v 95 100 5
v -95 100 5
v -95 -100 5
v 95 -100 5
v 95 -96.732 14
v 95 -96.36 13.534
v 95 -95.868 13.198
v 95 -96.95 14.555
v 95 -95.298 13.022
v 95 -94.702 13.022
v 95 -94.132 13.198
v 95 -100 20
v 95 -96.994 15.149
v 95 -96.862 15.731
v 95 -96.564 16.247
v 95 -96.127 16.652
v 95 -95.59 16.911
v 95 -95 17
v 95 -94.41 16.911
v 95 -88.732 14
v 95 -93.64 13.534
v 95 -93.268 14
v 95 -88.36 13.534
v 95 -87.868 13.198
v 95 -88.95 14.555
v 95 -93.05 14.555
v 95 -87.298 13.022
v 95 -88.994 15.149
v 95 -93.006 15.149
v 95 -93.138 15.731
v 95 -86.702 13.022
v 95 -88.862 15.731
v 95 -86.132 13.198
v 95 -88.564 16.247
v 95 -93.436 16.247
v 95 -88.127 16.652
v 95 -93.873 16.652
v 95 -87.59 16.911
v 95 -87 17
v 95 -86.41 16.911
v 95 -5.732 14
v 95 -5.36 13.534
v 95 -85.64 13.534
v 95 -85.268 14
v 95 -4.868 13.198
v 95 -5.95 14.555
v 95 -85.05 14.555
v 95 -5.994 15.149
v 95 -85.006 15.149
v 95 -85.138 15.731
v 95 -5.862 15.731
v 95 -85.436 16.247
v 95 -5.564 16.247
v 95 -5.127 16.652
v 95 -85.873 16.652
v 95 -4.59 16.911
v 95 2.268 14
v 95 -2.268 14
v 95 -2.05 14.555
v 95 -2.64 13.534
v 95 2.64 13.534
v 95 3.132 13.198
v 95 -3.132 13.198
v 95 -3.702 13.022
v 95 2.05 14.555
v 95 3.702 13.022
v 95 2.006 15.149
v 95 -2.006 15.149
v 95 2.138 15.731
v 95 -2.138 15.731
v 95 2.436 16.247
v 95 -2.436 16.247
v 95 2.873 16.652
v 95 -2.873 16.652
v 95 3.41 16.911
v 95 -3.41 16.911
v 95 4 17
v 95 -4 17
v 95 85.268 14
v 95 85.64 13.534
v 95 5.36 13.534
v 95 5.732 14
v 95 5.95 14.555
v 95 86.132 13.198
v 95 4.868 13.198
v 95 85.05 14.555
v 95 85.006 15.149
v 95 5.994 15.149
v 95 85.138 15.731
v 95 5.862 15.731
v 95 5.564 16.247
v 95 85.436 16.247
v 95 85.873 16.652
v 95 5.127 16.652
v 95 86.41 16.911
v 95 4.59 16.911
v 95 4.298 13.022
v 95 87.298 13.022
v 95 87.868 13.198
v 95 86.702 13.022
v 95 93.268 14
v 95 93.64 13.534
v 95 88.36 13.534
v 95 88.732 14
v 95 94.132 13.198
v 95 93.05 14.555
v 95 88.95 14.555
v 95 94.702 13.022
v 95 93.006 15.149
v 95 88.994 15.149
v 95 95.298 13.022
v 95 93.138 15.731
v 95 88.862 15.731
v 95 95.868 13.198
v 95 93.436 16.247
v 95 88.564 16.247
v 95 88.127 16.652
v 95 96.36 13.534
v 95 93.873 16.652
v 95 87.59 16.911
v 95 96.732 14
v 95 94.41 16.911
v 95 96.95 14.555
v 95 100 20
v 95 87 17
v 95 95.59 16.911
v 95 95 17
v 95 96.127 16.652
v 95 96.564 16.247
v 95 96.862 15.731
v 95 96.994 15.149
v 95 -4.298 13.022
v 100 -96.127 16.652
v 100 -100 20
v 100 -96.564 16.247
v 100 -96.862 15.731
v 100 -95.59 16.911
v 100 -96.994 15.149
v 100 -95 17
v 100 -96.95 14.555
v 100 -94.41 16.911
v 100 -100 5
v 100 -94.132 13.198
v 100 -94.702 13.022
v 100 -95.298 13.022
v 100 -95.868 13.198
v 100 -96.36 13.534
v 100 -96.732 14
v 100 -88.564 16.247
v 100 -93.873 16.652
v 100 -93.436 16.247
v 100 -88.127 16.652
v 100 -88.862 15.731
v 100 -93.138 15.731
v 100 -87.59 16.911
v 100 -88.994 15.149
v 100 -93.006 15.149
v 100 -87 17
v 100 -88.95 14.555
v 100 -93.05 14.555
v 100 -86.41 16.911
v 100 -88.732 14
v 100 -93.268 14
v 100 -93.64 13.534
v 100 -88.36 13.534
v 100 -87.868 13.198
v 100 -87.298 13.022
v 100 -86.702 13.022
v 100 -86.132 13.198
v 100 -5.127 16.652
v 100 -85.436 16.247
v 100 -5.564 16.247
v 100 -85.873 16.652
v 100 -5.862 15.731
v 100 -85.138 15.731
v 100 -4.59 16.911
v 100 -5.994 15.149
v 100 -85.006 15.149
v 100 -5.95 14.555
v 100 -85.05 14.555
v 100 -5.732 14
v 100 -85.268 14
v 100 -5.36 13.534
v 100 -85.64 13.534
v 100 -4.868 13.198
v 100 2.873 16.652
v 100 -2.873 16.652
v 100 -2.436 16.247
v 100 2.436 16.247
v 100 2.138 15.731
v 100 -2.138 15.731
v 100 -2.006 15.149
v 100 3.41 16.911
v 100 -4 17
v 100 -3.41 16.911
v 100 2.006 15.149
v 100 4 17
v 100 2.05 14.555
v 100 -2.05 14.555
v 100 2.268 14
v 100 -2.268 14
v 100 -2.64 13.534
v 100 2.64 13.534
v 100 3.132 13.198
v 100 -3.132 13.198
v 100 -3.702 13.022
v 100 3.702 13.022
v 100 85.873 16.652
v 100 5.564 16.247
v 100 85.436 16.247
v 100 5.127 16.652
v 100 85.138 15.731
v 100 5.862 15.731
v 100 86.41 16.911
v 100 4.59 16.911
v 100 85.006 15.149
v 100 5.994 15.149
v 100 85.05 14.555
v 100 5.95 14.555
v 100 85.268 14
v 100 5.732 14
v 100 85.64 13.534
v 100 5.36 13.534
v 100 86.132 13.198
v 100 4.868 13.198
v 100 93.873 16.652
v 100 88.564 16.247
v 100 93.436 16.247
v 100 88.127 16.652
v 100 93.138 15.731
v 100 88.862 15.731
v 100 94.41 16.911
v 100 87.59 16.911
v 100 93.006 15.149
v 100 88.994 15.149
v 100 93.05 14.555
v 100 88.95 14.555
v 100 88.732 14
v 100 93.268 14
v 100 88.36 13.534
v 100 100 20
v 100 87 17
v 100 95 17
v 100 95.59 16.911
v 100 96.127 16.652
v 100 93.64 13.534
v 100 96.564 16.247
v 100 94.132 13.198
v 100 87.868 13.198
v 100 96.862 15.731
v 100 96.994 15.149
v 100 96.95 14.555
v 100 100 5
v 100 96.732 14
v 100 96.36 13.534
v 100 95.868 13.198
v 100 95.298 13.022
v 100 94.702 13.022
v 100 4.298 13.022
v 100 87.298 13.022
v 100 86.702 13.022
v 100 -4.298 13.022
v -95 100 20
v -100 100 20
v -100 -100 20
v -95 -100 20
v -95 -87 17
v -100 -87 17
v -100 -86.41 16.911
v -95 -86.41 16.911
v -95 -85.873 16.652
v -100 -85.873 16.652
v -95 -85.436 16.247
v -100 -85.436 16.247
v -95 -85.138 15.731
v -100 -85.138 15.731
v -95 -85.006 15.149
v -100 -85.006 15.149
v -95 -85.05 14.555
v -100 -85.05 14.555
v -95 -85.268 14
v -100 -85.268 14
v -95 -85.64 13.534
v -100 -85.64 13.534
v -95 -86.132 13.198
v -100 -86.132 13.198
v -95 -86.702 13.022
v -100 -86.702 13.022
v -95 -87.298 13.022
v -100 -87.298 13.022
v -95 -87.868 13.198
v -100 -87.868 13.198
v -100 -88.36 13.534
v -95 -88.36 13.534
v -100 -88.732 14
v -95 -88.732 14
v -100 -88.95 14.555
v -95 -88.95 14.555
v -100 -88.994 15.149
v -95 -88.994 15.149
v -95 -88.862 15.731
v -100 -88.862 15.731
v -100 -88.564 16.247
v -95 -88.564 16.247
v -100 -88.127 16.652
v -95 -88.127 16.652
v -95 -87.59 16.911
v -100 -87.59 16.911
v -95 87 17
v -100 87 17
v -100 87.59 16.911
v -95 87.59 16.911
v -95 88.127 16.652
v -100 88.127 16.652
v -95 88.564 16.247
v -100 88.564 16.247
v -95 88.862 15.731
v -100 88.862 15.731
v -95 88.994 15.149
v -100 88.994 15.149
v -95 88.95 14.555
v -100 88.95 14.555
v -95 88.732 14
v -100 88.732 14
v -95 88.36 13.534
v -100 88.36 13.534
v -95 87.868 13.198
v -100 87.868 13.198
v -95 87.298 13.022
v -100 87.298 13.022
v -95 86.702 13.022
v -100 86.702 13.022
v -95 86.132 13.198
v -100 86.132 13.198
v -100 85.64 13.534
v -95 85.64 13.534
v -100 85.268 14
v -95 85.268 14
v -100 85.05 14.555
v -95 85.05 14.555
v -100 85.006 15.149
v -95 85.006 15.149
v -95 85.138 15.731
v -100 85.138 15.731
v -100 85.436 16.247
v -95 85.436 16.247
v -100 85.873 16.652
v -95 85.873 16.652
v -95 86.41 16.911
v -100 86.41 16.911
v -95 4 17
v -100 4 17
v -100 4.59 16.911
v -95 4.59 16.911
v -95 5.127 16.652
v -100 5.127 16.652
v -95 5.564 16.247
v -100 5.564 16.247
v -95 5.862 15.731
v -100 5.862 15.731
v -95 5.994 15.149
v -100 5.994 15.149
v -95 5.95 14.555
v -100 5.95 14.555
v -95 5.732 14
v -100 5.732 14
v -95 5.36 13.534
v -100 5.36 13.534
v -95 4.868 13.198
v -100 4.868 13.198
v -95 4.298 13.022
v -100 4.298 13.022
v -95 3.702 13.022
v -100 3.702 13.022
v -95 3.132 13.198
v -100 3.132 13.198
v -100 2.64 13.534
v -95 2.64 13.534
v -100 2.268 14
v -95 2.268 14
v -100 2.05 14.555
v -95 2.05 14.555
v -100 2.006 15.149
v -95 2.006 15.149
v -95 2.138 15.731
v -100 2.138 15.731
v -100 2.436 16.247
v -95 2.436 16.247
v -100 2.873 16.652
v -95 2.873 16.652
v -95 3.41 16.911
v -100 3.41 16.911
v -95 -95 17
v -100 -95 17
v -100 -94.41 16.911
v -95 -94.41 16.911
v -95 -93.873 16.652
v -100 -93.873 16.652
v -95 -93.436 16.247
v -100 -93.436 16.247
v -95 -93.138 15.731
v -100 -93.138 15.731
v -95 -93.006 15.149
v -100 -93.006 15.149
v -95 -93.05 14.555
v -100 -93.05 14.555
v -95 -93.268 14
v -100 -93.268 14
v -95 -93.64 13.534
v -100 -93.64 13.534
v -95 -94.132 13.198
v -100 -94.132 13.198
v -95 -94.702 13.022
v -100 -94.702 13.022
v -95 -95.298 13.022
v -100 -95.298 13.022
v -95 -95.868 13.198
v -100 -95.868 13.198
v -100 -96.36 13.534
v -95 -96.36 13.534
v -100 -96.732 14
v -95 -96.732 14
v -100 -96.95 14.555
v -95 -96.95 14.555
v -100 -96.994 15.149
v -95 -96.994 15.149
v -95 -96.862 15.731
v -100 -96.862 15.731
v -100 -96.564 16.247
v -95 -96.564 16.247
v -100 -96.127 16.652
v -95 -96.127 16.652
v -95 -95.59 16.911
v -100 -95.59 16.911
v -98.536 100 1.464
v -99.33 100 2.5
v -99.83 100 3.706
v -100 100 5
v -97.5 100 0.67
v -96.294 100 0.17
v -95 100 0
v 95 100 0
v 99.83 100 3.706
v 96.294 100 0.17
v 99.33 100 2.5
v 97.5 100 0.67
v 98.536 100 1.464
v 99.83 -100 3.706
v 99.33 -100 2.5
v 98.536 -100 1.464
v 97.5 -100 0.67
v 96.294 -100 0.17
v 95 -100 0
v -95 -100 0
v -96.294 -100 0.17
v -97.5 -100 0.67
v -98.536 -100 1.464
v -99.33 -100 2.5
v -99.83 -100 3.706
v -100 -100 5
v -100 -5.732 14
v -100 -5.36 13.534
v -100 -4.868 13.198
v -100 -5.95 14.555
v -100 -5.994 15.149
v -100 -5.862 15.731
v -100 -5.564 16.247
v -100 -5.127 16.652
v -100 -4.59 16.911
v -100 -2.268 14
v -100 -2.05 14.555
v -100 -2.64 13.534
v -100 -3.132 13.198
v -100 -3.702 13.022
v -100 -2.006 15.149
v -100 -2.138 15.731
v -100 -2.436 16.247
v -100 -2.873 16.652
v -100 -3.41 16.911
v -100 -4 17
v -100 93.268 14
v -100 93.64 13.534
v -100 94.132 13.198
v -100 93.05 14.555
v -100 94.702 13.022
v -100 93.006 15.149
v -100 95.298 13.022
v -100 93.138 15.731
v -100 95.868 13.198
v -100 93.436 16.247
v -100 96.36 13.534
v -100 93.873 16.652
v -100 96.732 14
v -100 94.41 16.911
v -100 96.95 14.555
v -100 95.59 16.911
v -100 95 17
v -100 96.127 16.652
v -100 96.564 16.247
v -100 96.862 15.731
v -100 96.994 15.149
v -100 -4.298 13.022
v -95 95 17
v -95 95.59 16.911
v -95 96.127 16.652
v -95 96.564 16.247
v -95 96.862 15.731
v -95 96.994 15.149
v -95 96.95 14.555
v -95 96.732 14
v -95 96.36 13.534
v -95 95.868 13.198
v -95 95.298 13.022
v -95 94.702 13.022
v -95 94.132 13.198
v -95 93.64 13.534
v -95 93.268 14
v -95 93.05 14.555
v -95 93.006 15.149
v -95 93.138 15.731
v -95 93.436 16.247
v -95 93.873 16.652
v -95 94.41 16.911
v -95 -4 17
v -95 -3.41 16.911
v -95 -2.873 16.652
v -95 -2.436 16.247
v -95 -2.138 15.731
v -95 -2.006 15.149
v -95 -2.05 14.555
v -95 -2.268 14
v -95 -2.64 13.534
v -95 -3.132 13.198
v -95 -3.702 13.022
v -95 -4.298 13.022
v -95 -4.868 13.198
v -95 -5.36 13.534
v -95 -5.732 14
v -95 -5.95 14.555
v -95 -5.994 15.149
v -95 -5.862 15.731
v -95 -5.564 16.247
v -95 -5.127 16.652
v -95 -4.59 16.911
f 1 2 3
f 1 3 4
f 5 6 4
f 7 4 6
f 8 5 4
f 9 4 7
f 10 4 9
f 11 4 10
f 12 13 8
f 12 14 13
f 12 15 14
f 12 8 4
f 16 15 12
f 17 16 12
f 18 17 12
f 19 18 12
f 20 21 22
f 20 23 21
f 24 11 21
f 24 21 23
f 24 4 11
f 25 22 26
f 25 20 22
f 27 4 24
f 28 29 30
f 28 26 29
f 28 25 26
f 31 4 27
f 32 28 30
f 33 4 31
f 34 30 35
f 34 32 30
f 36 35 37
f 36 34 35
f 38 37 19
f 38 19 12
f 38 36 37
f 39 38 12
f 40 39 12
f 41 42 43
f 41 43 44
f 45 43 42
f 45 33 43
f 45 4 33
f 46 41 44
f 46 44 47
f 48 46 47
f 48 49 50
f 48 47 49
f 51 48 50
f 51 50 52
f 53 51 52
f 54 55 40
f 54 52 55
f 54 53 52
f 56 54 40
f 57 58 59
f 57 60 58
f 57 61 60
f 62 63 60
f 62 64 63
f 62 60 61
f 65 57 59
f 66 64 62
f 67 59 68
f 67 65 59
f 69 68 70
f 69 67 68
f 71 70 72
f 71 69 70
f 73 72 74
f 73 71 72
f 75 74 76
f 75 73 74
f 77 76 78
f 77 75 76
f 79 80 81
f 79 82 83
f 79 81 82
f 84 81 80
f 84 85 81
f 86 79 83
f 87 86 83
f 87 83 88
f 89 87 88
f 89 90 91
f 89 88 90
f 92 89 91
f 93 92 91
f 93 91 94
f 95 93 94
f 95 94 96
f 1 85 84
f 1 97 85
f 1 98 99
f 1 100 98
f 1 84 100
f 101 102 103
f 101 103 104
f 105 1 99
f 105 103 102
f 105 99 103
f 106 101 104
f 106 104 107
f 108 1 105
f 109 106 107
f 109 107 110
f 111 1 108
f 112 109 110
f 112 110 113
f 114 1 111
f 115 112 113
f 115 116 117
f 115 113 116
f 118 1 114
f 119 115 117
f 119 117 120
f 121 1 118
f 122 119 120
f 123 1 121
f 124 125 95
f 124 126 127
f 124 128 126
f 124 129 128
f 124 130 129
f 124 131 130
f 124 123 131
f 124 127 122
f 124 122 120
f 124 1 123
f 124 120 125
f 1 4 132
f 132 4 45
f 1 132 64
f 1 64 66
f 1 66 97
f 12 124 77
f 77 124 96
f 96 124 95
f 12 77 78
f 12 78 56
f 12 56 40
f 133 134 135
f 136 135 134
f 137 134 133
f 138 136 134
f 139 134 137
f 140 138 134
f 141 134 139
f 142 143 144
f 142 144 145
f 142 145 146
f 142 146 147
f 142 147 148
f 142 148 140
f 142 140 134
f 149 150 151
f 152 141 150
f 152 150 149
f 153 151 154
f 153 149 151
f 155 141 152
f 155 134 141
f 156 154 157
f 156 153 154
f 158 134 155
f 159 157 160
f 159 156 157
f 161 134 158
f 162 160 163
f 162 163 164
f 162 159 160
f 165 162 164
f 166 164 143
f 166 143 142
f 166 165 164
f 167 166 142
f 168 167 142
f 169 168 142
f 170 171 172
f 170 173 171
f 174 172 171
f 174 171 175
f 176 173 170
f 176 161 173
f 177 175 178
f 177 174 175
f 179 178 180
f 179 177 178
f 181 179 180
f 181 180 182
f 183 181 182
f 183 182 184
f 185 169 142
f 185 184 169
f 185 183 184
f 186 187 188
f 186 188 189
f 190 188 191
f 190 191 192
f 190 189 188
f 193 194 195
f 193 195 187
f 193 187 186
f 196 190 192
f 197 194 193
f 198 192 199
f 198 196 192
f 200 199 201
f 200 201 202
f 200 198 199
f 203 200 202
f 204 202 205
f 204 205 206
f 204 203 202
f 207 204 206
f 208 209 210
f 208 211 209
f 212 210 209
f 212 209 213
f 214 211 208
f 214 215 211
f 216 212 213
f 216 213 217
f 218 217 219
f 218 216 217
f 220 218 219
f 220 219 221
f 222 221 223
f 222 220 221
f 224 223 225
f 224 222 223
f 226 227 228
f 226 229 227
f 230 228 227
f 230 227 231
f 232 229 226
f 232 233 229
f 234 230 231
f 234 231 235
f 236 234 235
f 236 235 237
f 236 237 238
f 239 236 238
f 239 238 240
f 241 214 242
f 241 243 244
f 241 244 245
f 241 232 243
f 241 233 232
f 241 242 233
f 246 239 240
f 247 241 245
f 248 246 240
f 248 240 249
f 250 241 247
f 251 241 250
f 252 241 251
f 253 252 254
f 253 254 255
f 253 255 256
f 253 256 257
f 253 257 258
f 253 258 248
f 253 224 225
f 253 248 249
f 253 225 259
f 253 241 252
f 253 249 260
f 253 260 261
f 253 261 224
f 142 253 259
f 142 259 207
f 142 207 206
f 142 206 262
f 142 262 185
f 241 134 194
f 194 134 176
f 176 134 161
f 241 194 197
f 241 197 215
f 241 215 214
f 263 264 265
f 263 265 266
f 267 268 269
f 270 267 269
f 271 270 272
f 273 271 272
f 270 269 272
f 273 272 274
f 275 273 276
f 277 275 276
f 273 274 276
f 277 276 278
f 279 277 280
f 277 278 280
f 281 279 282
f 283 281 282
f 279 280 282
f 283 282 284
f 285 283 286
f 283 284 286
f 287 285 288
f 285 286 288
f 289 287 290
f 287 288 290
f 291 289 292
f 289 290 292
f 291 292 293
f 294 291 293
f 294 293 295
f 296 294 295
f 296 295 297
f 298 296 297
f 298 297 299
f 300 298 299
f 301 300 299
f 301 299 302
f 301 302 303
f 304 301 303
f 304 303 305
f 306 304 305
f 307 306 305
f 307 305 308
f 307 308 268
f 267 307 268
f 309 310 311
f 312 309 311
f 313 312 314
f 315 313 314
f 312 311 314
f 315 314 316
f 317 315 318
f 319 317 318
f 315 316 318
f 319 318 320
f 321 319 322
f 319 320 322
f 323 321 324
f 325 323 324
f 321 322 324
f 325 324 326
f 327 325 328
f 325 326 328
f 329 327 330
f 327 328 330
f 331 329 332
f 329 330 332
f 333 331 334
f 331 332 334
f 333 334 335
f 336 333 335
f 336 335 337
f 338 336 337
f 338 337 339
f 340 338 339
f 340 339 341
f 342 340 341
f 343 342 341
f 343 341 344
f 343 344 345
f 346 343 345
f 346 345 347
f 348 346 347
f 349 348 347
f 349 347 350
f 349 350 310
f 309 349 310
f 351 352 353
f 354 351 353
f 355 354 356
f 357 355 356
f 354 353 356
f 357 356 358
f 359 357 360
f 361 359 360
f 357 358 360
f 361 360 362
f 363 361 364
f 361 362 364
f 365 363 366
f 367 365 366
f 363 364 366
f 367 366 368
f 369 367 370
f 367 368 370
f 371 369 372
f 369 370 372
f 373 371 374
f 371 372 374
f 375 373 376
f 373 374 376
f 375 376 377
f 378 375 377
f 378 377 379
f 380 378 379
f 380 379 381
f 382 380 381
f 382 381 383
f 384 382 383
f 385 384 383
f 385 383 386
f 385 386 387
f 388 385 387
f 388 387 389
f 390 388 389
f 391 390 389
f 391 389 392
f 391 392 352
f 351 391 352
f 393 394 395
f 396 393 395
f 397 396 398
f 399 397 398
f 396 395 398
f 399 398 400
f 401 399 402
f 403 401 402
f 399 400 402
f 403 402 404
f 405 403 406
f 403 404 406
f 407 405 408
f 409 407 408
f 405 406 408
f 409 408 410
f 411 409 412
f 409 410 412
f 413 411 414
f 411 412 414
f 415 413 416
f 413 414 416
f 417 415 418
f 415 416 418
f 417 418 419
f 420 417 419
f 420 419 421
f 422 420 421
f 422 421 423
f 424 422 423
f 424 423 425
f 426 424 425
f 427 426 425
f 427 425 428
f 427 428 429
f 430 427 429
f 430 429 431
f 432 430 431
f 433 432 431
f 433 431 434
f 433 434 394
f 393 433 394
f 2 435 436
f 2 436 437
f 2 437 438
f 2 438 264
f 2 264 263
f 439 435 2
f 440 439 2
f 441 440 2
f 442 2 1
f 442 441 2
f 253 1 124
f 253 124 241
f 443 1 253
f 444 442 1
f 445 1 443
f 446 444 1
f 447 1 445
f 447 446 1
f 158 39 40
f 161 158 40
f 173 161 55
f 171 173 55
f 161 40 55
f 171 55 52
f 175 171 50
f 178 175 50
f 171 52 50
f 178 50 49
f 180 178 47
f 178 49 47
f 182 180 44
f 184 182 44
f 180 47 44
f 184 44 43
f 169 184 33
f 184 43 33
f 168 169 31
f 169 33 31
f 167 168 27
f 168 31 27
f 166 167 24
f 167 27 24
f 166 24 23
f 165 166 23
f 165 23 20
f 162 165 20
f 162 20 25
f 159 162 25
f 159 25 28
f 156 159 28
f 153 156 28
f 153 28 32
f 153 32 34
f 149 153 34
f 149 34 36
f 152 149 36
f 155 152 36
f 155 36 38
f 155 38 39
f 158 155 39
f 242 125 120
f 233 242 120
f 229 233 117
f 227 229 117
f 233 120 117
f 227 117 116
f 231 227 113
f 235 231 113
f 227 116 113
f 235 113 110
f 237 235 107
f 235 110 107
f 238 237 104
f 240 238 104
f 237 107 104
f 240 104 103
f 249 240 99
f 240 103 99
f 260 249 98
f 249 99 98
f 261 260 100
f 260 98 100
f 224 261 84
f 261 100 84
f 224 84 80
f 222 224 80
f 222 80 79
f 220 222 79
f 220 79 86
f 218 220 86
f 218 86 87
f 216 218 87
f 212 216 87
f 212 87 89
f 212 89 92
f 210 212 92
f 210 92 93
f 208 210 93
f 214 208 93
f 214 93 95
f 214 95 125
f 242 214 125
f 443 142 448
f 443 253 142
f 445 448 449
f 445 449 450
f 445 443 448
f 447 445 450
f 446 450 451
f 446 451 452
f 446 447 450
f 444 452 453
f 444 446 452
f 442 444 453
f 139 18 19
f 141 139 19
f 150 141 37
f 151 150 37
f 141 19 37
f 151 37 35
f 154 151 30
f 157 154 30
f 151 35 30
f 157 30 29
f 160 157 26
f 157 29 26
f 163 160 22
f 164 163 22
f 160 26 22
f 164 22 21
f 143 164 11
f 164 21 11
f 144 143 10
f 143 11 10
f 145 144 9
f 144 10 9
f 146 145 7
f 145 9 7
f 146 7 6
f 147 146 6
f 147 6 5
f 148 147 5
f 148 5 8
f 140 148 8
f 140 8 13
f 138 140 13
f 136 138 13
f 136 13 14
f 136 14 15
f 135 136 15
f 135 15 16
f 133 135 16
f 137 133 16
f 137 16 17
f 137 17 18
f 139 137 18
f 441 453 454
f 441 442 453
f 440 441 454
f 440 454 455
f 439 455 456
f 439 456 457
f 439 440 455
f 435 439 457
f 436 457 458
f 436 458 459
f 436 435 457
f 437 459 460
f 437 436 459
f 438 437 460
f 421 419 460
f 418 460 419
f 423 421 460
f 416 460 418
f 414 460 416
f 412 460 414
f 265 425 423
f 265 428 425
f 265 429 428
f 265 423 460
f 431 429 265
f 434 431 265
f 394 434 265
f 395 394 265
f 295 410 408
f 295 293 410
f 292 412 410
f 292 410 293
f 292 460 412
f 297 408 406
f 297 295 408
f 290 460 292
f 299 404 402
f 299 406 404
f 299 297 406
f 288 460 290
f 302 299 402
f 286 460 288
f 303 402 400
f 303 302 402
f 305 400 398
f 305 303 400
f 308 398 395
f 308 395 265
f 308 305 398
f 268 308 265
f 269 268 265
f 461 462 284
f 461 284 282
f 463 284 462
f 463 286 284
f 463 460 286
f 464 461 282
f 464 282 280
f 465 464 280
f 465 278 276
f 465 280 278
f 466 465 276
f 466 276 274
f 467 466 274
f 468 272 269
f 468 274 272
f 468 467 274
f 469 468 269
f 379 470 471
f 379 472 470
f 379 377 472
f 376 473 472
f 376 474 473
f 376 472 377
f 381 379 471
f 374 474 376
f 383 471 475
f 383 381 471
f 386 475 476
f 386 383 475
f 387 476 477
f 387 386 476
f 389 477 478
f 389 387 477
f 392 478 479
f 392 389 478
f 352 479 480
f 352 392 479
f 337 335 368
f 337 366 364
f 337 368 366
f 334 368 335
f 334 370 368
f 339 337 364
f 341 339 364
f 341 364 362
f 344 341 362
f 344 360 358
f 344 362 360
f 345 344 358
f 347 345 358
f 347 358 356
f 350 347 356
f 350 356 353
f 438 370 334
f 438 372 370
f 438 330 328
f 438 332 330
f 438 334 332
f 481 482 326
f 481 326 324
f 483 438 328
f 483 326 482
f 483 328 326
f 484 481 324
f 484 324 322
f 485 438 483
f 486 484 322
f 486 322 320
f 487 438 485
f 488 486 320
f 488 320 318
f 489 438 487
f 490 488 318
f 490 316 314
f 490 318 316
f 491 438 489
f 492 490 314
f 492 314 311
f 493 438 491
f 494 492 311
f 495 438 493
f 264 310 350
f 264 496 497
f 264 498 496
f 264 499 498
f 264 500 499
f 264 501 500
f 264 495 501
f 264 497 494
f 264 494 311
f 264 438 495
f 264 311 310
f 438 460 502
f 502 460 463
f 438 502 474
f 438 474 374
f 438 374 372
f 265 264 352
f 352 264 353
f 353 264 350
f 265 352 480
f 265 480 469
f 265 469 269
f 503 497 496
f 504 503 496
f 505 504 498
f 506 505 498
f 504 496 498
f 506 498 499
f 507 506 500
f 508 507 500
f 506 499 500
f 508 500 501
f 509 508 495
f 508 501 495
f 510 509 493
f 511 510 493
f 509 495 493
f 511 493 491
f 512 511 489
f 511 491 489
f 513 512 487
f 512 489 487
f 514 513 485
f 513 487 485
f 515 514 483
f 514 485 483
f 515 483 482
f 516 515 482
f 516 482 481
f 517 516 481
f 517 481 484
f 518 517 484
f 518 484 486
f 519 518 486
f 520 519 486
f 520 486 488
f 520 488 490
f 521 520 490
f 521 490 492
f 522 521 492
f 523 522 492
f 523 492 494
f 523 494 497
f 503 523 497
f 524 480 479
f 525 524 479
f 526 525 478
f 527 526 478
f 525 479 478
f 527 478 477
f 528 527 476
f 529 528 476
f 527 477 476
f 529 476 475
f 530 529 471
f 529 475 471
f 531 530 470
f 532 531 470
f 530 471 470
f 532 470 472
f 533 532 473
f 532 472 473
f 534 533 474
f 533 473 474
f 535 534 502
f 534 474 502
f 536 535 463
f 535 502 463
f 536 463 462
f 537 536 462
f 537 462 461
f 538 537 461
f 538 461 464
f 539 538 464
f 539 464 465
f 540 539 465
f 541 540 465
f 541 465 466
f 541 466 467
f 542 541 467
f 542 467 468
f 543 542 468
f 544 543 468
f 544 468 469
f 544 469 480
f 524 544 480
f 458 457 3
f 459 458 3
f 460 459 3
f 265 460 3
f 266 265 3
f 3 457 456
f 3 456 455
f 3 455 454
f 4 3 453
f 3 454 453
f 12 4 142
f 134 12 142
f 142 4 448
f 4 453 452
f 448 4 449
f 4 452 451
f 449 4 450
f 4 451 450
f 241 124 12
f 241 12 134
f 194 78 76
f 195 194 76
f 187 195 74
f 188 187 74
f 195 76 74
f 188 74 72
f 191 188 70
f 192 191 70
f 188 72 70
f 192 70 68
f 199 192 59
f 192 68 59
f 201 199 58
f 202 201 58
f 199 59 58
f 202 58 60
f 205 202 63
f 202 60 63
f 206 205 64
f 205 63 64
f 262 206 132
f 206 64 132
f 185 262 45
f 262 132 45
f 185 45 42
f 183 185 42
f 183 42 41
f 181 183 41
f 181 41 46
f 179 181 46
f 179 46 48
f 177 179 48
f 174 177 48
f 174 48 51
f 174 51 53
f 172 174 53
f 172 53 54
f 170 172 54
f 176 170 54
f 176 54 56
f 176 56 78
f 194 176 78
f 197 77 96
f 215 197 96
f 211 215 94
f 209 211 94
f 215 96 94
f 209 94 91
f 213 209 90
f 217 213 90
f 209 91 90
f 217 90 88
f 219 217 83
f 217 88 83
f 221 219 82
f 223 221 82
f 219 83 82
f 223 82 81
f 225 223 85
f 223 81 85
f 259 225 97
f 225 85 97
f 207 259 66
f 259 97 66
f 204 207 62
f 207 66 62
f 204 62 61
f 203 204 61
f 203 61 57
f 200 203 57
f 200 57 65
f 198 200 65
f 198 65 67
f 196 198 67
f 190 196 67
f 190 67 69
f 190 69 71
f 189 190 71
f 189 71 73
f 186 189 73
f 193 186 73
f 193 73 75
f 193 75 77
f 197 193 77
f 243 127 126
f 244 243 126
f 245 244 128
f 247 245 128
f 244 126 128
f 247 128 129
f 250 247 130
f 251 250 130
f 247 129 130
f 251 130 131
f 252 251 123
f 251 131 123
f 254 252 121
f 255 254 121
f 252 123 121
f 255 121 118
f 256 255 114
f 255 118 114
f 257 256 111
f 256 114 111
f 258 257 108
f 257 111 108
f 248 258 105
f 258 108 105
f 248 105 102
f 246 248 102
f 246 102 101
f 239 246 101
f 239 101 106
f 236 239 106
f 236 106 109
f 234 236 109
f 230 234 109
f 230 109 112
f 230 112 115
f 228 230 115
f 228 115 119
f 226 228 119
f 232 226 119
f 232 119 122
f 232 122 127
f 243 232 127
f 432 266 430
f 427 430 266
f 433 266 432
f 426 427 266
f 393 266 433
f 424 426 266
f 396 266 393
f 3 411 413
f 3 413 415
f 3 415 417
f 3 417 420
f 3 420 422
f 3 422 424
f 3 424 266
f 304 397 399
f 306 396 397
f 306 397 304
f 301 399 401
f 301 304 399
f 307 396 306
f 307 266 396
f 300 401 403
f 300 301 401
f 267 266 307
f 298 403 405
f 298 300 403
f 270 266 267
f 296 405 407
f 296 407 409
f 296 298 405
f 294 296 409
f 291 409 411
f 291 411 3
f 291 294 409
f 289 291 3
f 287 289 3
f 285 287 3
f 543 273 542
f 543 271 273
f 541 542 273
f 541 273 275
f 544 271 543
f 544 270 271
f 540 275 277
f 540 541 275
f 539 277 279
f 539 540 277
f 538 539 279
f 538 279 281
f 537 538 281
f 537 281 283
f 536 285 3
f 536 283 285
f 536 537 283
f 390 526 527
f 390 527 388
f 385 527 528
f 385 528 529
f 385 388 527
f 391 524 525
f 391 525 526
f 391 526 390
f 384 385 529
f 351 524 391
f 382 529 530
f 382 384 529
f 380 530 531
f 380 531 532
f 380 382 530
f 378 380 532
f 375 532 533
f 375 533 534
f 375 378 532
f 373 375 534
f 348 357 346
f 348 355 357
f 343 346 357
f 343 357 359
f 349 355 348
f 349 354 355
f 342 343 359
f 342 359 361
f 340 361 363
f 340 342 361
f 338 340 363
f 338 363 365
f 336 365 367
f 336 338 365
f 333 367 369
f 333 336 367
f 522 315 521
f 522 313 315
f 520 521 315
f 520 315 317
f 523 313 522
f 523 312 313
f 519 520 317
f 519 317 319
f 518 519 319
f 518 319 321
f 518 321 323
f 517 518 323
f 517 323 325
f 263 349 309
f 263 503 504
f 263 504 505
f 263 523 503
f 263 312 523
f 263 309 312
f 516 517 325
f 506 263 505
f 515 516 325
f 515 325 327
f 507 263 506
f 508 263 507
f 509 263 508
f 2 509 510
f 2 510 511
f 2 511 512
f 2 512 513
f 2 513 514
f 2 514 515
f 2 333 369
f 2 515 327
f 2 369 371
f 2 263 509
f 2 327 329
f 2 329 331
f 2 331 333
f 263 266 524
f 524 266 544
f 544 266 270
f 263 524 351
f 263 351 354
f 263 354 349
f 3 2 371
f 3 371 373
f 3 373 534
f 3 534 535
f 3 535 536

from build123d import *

# Parameters (mm, degrees)
BOSS_EXTRUDE1_DEPTH = 100
SKETCH4_R           = 2
CUT_EXTRUDE1_DEPTH  = 214


with BuildPart() as part:
    # Sketch3 → Boss-Extrude1 (new, symmetric)
    with BuildSketch(Plane(origin=(0, 0, 0), x_dir=(1, 0, 0), z_dir=(0, 1, 0))):
        with BuildLine():
            Line((95, 0), (-95, 0))
            ThreePointArc((-95, 0), (-98.535533906, -1.464466094), (-100, -5))
            Line((-100, -5), (-100, -20))
            Line((-100, -20), (-95, -20))
            Line((-95, -20), (-95, -5))
            Line((-95, -5), (95, -5))
            Line((95, -5), (95, -20))
            Line((95, -20), (100, -20))
            Line((100, -20), (100, -5))
            ThreePointArc((100, -5), (98.535533906, -1.464466094), (95, 0))
        make_face()
    extrude(amount=BOSS_EXTRUDE1_DEPTH, both=True)

    # Sketch4 → Cut-Extrude1 (cut)
    with BuildSketch(Plane.ZY.offset(100)):
        with Locations((15, 95)):
            Circle(SKETCH4_R)
        with Locations((15, 87)):
            Circle(SKETCH4_R)
        with Locations((15, 4)):
            Circle(SKETCH4_R)
        with Locations((15, -4)):
            Circle(SKETCH4_R)
        with Locations((15, -95)):
            Circle(SKETCH4_R)
        with Locations((15, -87)):
            Circle(SKETCH4_R)
    extrude(amount=-CUT_EXTRUDE1_DEPTH, mode=Mode.SUBTRACT)


solid = part.part
